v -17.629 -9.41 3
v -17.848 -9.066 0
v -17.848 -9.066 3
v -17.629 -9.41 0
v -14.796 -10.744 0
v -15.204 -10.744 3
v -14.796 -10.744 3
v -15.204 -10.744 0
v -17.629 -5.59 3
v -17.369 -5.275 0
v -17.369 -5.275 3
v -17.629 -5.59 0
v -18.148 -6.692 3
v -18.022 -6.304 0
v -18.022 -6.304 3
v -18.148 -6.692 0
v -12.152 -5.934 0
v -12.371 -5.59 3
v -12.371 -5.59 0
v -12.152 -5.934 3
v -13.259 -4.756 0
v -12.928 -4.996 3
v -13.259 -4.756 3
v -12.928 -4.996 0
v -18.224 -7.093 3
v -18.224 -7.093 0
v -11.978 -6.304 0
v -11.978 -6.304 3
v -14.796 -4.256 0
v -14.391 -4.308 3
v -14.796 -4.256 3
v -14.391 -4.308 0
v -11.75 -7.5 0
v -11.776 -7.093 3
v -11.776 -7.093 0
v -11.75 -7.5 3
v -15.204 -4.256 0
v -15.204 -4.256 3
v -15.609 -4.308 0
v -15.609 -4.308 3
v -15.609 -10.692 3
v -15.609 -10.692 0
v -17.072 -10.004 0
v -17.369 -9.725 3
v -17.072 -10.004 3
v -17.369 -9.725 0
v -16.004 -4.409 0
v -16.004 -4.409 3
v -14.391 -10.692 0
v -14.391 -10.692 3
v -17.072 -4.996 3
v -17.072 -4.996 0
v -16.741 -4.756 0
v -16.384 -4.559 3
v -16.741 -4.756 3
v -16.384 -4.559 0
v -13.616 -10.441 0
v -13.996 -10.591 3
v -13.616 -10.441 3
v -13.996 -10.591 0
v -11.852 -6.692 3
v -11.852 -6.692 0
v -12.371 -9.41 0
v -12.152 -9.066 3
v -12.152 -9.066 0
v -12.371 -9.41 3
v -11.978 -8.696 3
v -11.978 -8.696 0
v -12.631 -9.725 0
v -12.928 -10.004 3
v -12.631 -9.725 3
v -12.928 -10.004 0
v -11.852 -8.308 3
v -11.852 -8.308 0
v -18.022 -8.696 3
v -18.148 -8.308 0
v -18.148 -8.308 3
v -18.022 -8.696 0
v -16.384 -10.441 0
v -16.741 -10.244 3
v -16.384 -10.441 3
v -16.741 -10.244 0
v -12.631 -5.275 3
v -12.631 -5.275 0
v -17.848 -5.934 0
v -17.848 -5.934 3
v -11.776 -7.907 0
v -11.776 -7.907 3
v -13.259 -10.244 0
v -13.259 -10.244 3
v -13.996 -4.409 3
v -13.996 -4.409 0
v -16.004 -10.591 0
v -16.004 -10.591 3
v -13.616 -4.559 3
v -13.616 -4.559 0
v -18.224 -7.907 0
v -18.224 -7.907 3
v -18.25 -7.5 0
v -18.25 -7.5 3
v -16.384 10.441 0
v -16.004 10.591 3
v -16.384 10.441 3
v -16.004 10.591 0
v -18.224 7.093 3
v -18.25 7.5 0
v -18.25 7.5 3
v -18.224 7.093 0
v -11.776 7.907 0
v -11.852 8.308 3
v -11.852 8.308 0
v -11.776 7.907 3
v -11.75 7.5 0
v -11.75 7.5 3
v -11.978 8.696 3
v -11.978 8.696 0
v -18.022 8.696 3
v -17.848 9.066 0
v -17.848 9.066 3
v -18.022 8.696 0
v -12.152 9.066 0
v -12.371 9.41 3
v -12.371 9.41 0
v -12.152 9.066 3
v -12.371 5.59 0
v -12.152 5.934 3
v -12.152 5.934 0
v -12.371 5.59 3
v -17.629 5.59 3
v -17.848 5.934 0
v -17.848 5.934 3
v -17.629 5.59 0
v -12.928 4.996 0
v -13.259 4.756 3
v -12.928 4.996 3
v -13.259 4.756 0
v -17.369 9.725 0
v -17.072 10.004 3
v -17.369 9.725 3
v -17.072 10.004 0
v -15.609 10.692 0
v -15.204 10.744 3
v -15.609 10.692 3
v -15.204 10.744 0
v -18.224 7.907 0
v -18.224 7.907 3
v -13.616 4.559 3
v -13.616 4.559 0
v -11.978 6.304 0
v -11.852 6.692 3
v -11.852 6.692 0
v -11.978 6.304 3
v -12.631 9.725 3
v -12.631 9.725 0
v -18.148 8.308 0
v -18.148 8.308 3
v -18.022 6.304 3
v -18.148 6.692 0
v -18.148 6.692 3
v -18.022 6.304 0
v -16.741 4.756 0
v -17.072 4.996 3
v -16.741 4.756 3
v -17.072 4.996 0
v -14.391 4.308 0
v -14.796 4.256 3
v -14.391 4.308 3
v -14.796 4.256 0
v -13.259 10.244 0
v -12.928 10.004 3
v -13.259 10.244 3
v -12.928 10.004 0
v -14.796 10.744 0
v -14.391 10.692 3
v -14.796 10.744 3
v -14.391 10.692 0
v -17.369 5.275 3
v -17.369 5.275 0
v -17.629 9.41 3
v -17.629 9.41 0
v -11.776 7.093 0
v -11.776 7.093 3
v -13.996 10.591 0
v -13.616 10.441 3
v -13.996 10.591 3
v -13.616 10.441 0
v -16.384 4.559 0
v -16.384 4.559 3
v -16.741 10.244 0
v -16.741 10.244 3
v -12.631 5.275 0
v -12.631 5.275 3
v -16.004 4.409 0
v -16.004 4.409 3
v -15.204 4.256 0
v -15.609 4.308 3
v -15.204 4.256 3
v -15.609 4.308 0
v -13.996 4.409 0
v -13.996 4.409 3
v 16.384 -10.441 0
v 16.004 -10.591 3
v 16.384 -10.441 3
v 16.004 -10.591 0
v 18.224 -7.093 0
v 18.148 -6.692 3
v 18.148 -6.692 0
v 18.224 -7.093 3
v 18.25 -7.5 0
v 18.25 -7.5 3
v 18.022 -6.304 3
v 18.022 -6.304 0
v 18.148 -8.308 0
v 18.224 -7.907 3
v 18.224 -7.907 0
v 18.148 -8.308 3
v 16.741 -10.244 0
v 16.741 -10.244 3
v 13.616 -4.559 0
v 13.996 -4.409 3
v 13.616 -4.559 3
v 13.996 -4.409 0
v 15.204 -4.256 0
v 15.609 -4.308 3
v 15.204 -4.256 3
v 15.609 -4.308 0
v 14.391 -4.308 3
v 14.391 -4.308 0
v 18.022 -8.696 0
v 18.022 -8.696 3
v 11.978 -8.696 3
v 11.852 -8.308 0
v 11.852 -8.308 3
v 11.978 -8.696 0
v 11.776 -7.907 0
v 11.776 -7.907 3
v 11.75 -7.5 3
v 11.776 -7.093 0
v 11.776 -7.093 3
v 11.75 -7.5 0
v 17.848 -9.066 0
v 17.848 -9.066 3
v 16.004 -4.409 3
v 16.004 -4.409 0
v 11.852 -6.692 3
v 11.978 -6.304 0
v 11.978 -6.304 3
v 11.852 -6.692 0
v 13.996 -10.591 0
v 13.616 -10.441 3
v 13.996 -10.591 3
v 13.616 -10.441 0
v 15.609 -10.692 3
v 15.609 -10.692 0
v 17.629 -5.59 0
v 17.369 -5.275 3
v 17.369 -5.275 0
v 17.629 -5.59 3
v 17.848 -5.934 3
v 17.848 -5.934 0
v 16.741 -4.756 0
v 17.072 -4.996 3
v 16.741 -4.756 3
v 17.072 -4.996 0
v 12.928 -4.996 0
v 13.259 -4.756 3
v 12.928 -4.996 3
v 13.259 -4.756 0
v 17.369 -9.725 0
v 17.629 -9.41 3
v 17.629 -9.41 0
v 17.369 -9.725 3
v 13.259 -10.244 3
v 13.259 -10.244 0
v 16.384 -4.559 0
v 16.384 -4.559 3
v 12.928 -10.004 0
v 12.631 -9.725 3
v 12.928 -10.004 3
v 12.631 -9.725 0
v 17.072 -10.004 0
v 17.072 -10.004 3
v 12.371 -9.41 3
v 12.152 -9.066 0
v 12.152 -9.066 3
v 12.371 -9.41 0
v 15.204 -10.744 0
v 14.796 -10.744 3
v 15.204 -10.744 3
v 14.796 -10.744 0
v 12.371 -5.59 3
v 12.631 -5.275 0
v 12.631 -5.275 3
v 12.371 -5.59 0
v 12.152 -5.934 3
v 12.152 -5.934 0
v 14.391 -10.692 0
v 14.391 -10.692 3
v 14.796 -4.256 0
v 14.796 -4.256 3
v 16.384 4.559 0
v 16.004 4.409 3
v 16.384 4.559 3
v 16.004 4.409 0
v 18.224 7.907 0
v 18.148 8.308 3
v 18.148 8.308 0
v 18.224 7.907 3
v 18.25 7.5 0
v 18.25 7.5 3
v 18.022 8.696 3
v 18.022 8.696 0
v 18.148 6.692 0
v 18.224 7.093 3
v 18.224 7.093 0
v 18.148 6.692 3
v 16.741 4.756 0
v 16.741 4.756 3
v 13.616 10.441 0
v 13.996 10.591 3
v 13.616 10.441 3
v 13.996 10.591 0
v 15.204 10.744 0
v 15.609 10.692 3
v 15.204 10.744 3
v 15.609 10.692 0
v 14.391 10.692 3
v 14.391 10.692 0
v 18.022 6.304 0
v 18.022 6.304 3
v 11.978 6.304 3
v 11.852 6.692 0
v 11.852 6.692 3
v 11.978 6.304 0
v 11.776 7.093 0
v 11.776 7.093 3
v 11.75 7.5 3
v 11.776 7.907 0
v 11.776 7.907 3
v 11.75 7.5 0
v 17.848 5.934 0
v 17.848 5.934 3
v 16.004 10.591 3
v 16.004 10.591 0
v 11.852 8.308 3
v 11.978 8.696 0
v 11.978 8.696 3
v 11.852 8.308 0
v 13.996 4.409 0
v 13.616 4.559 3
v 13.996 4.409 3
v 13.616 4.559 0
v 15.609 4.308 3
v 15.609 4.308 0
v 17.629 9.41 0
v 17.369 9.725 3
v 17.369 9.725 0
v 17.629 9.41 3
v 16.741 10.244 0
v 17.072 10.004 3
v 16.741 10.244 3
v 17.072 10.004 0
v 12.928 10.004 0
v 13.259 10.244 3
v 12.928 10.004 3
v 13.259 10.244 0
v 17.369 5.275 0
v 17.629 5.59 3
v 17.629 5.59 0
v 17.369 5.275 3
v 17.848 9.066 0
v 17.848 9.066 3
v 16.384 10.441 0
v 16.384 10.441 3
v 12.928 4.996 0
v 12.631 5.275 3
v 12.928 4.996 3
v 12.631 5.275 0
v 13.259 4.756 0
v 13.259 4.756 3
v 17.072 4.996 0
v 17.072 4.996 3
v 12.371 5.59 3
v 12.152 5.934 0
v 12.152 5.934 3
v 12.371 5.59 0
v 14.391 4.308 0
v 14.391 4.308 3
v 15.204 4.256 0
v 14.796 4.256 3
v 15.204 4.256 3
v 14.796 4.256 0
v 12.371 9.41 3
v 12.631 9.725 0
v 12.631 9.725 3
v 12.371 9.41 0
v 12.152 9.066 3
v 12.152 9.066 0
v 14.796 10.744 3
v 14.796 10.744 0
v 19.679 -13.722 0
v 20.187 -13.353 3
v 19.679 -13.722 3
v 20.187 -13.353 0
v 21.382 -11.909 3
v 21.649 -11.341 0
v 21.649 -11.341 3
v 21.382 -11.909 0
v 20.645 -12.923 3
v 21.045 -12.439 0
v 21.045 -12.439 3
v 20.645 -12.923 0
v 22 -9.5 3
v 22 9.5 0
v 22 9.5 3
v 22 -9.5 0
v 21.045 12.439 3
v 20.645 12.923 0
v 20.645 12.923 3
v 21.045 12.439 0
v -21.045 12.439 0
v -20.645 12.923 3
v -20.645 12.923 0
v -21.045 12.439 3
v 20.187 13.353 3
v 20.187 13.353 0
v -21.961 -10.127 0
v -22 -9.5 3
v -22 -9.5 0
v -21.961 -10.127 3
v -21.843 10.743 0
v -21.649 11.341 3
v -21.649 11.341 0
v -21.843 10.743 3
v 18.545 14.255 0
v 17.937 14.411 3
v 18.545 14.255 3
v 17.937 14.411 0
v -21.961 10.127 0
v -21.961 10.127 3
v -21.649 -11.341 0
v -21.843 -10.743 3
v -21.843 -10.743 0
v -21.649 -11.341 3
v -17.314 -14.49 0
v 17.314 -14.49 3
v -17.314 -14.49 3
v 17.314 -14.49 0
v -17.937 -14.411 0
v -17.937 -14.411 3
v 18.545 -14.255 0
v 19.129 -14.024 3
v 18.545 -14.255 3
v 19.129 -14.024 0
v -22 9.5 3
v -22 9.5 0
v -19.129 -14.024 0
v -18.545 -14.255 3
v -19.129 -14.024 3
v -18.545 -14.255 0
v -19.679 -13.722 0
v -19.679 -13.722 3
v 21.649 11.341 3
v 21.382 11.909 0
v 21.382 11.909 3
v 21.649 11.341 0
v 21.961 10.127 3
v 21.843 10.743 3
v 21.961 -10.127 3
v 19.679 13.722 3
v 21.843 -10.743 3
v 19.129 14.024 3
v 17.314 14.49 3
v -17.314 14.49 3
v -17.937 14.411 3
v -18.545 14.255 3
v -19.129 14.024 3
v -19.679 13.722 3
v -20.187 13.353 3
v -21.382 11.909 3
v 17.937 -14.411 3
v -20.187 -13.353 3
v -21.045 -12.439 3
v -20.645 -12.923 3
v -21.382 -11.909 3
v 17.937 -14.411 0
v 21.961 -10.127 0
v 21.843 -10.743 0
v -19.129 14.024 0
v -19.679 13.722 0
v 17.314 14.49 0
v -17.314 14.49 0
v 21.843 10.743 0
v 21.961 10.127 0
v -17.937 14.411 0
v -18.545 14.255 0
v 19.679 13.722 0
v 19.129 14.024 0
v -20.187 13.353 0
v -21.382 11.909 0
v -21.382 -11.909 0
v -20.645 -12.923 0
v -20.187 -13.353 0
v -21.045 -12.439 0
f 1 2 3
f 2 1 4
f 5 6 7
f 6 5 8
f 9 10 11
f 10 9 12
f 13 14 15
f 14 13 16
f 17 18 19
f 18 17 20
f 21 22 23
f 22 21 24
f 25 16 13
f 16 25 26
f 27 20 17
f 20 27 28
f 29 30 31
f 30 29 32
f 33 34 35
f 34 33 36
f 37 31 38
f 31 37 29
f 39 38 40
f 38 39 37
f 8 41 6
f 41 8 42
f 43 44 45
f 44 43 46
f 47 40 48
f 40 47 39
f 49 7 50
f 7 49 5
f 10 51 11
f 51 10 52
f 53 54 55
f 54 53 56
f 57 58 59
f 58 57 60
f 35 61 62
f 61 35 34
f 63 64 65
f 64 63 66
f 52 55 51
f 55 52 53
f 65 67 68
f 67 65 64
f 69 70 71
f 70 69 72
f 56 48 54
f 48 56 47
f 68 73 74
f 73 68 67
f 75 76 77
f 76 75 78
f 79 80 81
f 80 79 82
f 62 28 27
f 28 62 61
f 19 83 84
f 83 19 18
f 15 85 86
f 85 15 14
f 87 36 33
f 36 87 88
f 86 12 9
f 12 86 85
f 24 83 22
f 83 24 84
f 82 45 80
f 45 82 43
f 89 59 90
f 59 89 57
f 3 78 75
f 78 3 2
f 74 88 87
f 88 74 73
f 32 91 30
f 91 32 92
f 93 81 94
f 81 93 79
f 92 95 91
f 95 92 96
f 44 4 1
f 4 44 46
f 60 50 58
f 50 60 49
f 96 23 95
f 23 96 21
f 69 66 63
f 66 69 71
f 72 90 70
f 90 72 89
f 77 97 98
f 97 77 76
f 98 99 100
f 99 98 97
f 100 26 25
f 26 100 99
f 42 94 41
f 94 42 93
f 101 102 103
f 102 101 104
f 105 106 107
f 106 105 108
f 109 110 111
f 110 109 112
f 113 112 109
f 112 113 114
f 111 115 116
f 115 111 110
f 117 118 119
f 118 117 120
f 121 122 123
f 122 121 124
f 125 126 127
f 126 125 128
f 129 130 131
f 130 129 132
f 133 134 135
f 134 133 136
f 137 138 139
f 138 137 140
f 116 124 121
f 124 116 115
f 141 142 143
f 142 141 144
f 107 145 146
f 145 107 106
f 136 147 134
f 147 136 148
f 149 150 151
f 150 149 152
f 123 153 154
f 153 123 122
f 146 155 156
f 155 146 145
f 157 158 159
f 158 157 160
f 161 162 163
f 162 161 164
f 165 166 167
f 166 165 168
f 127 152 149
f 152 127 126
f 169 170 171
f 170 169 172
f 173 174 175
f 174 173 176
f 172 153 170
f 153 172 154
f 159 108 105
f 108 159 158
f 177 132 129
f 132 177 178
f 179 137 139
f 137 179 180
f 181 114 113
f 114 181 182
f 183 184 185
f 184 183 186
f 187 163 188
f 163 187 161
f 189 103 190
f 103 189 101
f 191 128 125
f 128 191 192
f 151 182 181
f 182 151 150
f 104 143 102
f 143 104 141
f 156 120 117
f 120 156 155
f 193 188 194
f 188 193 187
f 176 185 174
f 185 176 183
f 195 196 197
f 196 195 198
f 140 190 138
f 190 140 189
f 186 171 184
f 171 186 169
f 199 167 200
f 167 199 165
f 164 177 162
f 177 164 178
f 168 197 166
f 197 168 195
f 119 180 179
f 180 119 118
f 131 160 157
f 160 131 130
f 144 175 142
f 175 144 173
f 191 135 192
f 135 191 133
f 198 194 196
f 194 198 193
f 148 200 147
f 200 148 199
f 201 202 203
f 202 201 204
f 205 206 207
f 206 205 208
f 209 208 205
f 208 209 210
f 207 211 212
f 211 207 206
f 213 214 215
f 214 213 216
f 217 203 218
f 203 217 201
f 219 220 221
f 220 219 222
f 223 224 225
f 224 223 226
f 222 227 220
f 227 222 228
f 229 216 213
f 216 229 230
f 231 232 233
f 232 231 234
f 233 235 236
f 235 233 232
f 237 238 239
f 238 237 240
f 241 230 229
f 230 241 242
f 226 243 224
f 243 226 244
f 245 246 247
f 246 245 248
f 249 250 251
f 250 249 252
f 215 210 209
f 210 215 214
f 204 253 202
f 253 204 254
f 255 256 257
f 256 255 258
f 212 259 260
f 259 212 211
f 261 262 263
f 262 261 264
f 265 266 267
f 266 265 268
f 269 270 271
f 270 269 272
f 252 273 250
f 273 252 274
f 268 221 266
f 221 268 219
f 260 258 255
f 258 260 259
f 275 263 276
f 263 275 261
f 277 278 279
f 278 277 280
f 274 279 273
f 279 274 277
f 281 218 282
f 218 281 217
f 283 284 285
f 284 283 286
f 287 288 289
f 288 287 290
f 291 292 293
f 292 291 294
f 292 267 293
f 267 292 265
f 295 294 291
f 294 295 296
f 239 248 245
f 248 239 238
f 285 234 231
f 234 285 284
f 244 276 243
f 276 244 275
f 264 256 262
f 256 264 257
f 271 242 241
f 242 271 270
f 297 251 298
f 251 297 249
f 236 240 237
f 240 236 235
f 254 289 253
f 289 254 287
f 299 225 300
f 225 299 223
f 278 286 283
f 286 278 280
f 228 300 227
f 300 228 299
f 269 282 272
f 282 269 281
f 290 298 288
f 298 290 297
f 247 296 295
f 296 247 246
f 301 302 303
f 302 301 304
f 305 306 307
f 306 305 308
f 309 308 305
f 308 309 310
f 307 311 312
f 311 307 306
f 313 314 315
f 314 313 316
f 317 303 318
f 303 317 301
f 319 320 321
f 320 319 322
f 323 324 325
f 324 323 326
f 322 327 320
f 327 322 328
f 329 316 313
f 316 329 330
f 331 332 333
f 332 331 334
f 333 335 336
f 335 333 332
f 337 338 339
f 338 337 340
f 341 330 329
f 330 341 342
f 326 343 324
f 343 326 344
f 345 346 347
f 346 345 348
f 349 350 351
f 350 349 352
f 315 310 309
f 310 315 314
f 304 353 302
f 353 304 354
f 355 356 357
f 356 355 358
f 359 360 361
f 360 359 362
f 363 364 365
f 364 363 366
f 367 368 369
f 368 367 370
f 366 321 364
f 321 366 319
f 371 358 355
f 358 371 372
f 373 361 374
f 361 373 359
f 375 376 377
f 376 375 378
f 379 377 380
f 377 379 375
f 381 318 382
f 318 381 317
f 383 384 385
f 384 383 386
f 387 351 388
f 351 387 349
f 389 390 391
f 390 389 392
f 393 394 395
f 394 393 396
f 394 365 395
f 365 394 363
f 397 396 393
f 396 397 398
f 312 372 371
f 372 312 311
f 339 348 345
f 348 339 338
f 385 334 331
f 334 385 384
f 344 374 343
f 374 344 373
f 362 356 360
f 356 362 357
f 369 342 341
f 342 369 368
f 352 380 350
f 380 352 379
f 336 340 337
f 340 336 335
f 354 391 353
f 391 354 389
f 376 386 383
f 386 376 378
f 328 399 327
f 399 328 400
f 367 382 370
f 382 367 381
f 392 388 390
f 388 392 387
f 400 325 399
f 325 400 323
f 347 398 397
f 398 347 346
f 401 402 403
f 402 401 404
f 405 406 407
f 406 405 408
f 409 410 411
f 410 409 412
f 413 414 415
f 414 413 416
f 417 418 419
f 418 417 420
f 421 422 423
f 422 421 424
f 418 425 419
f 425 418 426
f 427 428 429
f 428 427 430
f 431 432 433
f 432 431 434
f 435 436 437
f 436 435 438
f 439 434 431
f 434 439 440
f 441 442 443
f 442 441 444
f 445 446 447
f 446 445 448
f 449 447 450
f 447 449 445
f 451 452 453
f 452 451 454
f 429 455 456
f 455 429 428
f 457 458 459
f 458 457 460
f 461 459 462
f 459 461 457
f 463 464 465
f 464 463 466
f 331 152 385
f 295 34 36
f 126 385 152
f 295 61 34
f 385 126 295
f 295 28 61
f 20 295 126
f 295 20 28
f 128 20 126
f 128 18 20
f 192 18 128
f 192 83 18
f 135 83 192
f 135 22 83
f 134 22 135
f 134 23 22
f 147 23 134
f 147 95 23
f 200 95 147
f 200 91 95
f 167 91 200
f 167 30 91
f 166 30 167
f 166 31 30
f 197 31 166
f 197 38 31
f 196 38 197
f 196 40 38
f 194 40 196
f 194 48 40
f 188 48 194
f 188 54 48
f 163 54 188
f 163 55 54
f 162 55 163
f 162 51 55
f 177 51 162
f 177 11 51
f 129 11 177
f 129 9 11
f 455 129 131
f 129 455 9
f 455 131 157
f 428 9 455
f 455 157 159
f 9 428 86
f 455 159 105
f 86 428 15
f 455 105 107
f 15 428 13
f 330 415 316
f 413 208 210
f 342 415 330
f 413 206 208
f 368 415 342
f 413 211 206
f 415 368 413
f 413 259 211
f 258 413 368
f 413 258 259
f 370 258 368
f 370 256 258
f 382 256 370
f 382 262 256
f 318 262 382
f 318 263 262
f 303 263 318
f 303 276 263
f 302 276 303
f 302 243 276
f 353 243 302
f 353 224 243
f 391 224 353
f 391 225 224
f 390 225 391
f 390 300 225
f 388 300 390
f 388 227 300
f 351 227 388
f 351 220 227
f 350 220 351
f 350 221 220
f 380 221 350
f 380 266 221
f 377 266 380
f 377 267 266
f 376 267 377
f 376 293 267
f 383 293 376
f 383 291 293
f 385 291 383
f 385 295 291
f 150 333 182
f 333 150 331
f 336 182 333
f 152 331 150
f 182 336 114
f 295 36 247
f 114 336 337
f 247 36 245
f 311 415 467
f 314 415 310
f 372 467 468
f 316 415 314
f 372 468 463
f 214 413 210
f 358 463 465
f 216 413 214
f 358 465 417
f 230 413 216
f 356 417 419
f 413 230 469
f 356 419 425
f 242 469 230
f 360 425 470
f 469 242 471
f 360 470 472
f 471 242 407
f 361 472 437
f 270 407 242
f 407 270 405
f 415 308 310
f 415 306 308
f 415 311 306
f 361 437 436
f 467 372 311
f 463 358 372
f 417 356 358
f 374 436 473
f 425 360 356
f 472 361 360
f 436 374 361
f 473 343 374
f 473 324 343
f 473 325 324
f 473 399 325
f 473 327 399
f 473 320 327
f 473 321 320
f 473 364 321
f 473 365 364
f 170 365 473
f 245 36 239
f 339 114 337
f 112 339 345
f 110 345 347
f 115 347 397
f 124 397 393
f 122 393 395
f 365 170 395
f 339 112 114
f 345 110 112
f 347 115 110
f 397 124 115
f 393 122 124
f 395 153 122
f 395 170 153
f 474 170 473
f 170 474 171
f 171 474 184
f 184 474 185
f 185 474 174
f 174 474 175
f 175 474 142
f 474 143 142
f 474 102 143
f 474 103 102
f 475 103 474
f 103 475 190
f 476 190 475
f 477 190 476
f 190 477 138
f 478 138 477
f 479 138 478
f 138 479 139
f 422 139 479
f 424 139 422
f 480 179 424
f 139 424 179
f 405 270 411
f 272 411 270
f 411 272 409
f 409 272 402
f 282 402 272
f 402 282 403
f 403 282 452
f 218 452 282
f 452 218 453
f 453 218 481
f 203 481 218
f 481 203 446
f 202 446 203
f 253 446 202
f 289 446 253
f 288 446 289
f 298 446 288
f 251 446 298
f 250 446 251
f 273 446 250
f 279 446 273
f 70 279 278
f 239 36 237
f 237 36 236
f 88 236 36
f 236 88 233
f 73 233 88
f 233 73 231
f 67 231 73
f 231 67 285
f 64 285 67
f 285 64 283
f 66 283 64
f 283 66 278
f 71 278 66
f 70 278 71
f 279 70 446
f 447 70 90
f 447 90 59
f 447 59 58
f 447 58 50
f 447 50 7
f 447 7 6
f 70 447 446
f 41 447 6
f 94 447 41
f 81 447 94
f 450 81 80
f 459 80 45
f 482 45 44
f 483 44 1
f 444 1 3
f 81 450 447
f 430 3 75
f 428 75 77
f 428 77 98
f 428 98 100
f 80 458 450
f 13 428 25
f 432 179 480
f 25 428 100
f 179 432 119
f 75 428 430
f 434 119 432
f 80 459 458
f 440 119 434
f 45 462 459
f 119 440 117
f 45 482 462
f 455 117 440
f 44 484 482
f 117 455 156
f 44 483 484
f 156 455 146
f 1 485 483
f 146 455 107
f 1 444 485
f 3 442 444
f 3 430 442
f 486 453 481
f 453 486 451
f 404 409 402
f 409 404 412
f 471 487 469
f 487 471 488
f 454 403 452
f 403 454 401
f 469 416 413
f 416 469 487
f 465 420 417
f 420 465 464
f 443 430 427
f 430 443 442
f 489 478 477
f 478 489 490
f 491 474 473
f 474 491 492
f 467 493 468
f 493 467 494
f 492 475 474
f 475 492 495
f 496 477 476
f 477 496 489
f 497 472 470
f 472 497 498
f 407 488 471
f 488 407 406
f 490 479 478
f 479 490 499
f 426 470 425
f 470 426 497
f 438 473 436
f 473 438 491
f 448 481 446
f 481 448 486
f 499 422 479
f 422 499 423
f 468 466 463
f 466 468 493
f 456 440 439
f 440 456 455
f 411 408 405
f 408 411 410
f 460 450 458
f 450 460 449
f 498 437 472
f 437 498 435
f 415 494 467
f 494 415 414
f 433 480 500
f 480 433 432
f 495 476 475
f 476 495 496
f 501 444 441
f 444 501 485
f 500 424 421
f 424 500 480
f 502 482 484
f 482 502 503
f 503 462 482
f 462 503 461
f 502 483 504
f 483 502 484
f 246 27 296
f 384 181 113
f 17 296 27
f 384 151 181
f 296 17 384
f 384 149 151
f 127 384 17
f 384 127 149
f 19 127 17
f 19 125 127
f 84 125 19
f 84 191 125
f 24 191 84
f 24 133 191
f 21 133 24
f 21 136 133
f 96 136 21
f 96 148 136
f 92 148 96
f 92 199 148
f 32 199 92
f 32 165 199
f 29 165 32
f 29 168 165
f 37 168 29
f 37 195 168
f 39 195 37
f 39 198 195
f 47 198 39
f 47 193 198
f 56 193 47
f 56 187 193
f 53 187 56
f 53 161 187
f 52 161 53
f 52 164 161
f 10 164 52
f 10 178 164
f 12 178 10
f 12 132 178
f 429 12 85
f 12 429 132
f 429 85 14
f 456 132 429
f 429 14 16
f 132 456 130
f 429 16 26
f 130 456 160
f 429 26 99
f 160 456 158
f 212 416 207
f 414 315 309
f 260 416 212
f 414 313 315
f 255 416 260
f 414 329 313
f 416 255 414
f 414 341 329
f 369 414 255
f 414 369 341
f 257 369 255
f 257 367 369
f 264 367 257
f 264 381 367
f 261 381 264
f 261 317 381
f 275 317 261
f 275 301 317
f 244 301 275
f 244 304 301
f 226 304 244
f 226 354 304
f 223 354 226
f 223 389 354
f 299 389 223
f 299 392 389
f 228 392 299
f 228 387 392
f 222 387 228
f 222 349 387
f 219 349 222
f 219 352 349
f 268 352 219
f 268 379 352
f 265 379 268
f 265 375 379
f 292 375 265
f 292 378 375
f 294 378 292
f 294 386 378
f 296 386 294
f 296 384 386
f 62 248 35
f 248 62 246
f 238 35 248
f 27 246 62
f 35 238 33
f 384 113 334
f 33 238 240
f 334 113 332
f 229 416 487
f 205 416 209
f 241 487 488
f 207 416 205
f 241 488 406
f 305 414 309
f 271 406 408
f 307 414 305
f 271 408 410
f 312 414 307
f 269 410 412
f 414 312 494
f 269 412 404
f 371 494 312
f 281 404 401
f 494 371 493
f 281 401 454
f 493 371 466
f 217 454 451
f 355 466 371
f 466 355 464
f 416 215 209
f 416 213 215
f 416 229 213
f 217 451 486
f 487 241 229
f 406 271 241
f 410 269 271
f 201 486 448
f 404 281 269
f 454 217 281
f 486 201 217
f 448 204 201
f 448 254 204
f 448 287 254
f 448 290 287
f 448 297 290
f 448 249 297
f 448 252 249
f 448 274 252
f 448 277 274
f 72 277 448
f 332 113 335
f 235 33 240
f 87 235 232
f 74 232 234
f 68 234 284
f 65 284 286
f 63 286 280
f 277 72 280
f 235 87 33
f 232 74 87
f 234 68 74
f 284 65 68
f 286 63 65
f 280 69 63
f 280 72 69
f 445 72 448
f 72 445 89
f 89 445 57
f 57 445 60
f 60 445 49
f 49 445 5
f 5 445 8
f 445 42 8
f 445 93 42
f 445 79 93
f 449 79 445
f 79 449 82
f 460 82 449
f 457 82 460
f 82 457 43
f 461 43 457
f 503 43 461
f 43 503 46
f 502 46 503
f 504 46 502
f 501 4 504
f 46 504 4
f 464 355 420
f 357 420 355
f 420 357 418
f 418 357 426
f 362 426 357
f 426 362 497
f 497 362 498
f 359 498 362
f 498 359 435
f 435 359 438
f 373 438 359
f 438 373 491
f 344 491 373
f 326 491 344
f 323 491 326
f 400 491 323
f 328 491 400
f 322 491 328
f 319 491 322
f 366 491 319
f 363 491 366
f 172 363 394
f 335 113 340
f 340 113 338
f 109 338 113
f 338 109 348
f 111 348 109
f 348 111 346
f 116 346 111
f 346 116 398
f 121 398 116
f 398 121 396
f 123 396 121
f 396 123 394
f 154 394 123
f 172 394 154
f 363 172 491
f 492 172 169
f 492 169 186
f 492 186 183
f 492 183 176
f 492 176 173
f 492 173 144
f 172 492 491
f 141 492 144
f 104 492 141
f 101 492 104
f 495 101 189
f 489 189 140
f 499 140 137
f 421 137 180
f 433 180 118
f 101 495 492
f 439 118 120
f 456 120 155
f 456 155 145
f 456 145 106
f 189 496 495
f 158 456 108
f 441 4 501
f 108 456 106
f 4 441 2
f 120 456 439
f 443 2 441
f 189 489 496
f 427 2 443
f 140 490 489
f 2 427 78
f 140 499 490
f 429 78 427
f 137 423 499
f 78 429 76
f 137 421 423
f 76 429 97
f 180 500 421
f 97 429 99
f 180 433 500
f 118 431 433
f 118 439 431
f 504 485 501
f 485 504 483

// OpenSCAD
$fn = 50;


difference() {
	union() {
		hull() {
			translate(v = [-17.0000000000, 9.5000000000, 0]) {
				cylinder(h = 3, r = 5);
			}
			translate(v = [17.0000000000, 9.5000000000, 0]) {
				cylinder(h = 3, r = 5);
			}
			translate(v = [-17.0000000000, -9.5000000000, 0]) {
				cylinder(h = 3, r = 5);
			}
			translate(v = [17.0000000000, -9.5000000000, 0]) {
				cylinder(h = 3, r = 5);
			}
		}
	}
	union() {
		translate(v = [-15.0000000000, -7.5000000000, -100.0000000000]) {
			cylinder(h = 200, r = 3.2500000000);
		}
		translate(v = [-15.0000000000, 7.5000000000, -100.0000000000]) {
			cylinder(h = 200, r = 3.2500000000);
		}
		translate(v = [15.0000000000, -7.5000000000, -100.0000000000]) {
			cylinder(h = 200, r = 3.2500000000);
		}
		translate(v = [15.0000000000, 7.5000000000, -100.0000000000]) {
			cylinder(h = 200, r = 3.2500000000);
		}
	}
}
